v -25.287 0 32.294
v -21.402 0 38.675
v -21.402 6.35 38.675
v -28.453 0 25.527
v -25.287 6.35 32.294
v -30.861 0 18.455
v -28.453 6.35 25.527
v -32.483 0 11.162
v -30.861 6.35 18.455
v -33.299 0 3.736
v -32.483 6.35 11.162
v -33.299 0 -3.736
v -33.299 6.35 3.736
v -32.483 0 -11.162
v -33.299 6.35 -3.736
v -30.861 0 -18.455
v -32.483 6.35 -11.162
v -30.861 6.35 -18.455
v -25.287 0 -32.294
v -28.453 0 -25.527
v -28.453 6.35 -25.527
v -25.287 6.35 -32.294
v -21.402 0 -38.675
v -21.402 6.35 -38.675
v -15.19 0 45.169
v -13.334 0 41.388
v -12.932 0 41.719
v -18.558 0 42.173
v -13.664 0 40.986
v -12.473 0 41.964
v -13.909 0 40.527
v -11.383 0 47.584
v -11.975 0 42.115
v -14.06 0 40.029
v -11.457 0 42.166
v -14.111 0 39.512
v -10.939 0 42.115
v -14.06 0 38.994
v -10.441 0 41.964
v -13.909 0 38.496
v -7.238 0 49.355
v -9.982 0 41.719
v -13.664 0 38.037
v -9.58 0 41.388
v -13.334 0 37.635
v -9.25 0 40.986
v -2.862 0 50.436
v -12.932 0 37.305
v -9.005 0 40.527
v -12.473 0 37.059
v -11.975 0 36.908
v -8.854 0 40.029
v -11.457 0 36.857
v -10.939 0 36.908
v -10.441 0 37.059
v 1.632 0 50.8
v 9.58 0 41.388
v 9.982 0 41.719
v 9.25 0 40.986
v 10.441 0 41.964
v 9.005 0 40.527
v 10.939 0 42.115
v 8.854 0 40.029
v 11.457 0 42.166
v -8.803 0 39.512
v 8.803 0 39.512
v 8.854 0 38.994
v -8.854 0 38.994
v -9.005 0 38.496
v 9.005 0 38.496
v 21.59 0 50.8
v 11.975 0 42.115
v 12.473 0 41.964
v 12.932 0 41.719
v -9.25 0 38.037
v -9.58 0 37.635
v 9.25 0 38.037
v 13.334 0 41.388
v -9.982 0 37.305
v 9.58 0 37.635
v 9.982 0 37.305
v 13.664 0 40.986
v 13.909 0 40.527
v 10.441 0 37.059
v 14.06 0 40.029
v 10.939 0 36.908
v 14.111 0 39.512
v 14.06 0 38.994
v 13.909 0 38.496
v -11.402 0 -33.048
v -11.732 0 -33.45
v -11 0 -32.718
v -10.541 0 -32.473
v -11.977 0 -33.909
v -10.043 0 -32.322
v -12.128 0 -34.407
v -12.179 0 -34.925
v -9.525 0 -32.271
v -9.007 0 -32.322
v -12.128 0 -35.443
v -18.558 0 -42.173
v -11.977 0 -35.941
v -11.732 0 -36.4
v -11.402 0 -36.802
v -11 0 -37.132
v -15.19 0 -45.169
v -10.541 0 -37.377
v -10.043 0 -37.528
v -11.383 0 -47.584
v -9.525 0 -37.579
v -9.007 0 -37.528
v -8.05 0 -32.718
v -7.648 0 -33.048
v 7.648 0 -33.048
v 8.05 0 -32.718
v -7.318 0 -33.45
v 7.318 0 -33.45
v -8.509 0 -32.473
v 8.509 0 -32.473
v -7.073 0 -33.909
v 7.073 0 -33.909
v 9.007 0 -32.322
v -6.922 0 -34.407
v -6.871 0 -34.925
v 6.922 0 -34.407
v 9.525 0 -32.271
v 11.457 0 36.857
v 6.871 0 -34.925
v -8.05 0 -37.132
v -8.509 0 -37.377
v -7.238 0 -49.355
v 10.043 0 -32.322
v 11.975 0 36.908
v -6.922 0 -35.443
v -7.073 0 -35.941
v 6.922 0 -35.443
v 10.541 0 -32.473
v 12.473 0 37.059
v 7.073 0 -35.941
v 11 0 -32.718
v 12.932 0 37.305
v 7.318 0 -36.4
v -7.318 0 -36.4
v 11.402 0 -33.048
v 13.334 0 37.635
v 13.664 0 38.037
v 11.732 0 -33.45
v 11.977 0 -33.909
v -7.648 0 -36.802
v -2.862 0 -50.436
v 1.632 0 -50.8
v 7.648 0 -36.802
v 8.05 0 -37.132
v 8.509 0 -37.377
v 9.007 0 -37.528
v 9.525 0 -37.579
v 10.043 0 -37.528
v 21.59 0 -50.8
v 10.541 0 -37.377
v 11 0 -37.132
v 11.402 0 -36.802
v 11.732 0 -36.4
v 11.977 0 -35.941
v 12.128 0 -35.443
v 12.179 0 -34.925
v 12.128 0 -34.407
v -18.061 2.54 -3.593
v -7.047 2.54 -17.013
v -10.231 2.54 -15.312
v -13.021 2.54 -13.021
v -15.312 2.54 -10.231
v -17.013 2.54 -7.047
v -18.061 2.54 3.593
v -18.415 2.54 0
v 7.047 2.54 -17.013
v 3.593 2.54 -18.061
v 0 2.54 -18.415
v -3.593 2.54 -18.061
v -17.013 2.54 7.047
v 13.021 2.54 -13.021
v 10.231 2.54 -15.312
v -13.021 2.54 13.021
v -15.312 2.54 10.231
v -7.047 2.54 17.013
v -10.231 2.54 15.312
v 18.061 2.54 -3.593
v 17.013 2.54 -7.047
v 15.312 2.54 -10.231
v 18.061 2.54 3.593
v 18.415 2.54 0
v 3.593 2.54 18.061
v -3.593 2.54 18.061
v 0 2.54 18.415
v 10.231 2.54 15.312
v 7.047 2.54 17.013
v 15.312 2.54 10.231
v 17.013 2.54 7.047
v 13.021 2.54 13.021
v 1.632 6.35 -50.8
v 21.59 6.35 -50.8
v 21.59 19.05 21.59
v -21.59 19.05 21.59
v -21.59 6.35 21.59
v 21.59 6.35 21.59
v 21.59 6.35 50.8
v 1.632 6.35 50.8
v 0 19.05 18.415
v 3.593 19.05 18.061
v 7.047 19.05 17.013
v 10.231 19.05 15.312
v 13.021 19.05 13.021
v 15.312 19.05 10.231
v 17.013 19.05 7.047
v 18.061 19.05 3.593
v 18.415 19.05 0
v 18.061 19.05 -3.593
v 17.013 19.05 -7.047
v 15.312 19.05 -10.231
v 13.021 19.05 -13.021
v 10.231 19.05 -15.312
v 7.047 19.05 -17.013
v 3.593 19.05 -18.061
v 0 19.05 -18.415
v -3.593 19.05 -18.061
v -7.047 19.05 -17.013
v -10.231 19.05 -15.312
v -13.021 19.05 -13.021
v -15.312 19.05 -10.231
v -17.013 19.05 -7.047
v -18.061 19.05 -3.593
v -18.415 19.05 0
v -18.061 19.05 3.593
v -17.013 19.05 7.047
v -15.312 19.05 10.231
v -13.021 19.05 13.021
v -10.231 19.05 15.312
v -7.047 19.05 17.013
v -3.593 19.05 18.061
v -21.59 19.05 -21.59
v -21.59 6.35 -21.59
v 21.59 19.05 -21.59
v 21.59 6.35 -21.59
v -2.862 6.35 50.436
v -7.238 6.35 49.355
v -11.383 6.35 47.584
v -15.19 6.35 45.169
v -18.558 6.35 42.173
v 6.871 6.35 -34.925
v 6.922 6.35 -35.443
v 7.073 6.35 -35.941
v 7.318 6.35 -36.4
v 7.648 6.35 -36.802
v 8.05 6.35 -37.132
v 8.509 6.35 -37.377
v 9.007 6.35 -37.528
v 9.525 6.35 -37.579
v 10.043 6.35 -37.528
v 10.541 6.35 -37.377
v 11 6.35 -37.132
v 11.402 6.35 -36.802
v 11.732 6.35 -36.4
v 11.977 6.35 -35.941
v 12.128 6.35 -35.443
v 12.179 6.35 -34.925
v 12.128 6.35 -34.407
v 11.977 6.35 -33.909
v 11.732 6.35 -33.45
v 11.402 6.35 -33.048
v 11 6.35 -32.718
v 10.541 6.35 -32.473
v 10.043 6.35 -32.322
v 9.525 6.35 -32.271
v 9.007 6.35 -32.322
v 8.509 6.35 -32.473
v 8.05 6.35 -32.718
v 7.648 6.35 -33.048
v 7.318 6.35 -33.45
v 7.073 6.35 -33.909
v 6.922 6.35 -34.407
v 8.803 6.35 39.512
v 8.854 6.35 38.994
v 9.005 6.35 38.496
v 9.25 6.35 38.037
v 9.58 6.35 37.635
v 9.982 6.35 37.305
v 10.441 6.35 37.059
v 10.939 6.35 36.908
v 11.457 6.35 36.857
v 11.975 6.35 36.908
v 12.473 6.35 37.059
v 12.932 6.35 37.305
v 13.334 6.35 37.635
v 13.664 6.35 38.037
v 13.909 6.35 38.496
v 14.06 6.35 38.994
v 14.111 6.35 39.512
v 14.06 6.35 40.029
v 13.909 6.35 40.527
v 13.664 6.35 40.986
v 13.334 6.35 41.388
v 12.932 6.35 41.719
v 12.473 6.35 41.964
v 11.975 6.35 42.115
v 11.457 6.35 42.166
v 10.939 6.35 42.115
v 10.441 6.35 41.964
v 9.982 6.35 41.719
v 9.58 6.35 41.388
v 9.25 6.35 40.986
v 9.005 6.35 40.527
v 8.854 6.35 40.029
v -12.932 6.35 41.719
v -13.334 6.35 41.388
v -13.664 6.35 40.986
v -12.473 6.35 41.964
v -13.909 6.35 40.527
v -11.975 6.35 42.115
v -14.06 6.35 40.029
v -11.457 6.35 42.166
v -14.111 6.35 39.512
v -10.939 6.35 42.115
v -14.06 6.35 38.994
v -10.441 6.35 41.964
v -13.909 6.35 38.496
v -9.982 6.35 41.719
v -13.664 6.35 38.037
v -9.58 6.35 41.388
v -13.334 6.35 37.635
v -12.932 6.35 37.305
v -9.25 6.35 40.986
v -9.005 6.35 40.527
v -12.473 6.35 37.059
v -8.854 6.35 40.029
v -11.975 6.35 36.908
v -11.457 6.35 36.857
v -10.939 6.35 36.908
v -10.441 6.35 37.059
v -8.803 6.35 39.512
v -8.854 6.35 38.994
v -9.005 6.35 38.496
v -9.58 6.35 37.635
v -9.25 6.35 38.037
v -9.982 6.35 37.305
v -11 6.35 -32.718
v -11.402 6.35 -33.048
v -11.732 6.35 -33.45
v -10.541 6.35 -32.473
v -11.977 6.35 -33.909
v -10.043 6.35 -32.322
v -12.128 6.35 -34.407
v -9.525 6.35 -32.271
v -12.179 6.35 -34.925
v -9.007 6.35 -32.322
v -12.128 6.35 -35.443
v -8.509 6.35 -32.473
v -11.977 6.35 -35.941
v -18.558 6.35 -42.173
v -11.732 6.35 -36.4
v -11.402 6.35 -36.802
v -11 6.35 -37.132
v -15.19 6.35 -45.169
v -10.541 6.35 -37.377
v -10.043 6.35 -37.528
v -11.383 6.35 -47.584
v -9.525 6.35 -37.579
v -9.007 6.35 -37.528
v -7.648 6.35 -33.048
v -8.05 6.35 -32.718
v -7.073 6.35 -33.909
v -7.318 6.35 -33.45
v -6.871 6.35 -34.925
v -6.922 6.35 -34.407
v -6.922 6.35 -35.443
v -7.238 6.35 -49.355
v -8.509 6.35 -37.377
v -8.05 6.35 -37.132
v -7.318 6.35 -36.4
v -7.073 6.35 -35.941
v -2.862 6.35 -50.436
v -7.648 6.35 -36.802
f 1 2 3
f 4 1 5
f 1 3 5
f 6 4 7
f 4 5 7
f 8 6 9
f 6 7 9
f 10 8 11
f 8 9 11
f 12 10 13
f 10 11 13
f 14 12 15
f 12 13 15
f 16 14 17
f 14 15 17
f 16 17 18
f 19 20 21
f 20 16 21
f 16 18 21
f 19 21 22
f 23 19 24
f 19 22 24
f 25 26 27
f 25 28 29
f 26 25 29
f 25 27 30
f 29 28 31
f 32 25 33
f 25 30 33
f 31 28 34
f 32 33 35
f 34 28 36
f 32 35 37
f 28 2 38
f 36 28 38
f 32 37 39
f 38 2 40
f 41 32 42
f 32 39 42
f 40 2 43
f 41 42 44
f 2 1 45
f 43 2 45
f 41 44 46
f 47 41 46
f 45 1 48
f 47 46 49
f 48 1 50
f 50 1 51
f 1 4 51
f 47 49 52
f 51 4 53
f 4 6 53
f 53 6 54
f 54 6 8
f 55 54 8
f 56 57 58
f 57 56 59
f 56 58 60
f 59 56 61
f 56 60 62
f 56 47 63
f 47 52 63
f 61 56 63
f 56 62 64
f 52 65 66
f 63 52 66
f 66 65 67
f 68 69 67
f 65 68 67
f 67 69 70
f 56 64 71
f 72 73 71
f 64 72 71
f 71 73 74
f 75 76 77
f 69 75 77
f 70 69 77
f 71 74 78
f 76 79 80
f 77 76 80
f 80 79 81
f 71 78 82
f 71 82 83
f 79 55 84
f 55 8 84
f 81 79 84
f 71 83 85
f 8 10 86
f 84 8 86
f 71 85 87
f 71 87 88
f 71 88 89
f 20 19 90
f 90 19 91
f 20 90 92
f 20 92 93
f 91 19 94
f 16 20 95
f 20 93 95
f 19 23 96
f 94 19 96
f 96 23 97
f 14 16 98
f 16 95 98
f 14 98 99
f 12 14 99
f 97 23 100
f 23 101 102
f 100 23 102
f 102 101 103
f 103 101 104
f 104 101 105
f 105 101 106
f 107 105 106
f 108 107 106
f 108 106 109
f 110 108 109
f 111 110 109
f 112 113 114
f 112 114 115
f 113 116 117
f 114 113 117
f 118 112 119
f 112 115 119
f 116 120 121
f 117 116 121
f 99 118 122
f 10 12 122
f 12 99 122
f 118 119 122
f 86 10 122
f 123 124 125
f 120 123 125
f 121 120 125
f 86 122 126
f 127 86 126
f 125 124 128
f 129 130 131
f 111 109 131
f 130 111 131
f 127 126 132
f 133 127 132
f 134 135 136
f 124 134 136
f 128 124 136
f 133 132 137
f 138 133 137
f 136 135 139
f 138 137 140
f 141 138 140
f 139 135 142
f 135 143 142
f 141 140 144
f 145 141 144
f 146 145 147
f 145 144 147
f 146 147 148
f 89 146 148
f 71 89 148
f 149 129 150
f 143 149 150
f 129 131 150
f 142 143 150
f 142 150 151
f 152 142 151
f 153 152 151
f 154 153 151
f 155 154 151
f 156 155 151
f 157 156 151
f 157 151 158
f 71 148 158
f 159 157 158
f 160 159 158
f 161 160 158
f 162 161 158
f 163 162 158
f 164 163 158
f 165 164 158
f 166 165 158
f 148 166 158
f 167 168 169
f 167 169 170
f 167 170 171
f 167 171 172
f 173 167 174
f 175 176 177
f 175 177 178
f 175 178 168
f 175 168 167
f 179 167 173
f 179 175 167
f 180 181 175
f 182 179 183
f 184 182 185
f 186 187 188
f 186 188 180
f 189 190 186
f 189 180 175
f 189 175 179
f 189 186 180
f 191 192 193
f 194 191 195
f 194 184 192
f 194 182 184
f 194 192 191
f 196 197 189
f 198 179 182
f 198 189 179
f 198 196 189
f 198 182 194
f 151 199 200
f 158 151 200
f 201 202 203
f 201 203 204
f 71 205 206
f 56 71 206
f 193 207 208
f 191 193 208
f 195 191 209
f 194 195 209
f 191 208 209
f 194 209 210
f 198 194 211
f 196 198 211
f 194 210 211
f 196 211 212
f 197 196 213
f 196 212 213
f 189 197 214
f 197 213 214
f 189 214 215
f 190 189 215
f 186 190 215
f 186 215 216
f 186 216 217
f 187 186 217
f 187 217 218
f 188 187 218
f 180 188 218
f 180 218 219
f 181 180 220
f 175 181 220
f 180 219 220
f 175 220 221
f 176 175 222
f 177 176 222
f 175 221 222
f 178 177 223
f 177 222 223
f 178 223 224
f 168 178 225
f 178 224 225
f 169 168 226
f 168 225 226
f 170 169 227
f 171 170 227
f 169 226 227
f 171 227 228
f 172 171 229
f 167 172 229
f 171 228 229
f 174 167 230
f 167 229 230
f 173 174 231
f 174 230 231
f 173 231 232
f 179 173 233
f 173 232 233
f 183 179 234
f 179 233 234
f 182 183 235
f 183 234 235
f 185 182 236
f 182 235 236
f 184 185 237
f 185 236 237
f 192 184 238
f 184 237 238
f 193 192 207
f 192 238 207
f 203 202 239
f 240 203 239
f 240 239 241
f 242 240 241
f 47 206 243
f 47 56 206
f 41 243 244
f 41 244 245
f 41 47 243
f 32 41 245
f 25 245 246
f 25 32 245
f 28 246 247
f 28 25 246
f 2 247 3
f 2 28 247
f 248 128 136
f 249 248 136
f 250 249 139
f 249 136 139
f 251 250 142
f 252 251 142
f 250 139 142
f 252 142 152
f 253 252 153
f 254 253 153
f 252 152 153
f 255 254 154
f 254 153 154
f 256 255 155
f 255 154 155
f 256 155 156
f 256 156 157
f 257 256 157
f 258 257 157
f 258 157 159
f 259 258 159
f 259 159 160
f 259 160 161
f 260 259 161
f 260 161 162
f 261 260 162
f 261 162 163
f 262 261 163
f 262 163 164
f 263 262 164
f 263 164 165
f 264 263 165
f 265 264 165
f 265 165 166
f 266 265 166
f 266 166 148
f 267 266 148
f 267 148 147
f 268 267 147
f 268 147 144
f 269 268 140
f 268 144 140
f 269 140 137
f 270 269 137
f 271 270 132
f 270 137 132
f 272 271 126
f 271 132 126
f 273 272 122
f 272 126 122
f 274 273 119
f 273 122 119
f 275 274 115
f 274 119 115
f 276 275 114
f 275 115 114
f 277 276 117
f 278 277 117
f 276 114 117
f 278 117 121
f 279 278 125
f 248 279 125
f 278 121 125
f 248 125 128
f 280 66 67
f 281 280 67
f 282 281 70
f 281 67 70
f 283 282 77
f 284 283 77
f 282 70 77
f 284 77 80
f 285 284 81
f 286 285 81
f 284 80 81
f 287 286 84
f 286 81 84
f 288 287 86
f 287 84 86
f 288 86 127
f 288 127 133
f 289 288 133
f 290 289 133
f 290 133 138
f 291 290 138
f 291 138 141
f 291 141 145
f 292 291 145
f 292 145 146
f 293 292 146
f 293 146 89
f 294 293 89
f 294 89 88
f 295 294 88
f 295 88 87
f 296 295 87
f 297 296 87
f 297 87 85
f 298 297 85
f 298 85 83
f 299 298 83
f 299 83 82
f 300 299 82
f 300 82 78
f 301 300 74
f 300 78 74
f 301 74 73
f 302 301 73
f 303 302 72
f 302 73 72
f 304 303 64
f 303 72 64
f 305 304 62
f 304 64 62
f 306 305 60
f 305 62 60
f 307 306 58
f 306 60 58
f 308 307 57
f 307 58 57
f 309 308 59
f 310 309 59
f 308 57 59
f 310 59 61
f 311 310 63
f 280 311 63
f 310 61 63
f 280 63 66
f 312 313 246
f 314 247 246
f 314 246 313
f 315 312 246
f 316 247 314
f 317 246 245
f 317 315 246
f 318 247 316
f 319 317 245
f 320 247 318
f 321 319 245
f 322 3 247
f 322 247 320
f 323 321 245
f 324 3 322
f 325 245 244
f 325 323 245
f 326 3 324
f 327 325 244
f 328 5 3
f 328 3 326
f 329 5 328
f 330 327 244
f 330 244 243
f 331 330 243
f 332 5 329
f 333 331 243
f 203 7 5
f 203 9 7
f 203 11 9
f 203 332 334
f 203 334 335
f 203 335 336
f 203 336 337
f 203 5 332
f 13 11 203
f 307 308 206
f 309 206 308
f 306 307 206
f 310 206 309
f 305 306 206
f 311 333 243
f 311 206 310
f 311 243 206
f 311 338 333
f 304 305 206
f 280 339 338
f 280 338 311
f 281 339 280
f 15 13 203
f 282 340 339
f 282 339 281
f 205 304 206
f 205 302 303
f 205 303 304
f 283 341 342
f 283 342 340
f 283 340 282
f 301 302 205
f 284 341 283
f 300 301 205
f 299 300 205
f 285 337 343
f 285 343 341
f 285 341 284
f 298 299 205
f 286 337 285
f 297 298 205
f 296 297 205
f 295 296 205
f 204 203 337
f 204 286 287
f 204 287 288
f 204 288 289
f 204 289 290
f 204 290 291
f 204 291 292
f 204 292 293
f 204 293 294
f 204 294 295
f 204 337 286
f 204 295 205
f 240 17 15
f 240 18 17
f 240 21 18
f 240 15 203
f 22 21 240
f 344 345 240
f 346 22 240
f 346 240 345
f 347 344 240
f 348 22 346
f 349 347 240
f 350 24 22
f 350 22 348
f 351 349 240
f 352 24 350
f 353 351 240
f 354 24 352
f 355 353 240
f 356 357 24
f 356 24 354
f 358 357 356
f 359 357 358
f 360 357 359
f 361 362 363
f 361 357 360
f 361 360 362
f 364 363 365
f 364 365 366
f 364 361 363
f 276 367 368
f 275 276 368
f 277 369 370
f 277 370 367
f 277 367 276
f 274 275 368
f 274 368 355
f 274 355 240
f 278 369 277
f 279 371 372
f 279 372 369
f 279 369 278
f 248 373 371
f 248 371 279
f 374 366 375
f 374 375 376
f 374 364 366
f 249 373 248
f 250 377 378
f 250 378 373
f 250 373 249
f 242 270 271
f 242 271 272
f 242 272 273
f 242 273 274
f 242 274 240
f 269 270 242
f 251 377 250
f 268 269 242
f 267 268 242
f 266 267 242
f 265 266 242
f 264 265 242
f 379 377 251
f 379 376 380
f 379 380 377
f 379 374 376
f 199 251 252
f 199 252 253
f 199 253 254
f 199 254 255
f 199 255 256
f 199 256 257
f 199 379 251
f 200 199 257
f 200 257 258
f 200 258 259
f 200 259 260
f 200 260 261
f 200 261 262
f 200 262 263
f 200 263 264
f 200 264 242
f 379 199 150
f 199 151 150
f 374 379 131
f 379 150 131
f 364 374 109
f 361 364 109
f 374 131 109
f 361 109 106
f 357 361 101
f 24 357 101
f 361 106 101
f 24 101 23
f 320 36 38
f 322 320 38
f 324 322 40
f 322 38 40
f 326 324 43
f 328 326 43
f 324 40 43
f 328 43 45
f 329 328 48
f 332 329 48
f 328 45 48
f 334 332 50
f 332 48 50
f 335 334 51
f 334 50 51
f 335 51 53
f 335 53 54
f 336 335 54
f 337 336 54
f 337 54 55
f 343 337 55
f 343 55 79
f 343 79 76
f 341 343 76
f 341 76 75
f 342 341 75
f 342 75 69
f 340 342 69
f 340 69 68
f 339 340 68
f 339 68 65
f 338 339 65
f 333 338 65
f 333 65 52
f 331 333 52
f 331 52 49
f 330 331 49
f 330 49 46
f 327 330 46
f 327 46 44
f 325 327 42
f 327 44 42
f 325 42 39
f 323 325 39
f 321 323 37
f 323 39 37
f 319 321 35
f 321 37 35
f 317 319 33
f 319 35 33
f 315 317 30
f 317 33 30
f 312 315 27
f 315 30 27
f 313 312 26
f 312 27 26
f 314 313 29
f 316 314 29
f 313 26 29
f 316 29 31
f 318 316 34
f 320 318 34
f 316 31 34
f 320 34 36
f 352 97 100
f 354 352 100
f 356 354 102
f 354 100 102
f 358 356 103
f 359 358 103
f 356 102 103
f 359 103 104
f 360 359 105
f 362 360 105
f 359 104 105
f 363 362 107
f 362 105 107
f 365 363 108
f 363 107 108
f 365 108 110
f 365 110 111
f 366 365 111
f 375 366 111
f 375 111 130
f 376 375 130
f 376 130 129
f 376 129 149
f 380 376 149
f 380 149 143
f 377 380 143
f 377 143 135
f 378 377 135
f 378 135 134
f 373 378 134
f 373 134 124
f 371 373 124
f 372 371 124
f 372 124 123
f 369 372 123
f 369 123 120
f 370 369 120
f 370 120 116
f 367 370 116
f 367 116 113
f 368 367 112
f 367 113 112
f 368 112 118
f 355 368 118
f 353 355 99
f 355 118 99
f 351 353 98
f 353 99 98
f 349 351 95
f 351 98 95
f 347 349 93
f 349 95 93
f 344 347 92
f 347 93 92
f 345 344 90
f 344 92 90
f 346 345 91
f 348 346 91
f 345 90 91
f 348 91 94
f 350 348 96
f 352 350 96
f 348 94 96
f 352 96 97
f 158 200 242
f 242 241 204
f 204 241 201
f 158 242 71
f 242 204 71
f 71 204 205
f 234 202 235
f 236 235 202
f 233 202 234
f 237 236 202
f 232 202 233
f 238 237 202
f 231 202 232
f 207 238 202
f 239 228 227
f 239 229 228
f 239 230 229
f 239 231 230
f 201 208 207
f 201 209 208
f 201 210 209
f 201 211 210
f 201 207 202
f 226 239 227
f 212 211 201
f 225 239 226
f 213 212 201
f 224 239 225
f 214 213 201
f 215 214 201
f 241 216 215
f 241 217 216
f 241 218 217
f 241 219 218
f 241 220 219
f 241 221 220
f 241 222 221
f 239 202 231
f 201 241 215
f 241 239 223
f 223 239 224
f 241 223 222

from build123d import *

# Parameters (mm, degrees)
SKETCH2_R                  = 57.15
BOSS_EXTRUDE1_DEPTH        = 19.05
SKETCH3_R                  = 18.415
CUT_EXTRUDE1_DEPTH         = 16.51
SKETCH3_4_R                = 57.15
SKETCH3_4_W                = 43.18
SKETCH3_4_H                = 43.18
CUT_EXTRUDE2_DEPTH         = 12.7
SKETCH5_W                  = 114.3
SKETCH5_H                  = 114.3
CUT_EXTRUDE3_DEPTH         = 12.7
FILLET1_R                  = 27.94
F_4_0_209_DIAMETER_HOLE1_D = 5.3086


with BuildPart() as part:
    # Sketch2 → Boss-Extrude1 (new body)
    with BuildSketch(Plane(origin=(0, 0, 0), x_dir=(1, 0, 0), z_dir=(0, 1, 0))):
        with BuildLine():
            Line((-57.15, 57.15), (-57.15, -6.4e-08))
            ThreePointArc((-57.15, -6.4e-08), (-40.411152555, 40.411152534), (3.4e-08, 57.15))
            Line((3.4e-08, 57.15), (-57.15, 57.15))
        make_face()
        Circle(SKETCH2_R)
        with BuildLine():
            ThreePointArc((3.4e-08, 57.15), (40.411152557, 40.411152533), (57.15, 0))
            Line((57.15, 0), (57.15, 57.15))
            Line((57.15, 57.15), (3.4e-08, 57.15))
        make_face()
        with BuildLine():
            ThreePointArc((57.15, 0), (40.411152582, -40.411152508), (1.05e-07, -57.15))
            Line((1.05e-07, -57.15), (57.15, -57.15))
            Line((57.15, -57.15), (57.15, 0))
        make_face()
        with BuildLine():
            Line((-57.15, -6.4e-08), (-57.15, -57.15))
            Line((-57.15, -57.15), (1.05e-07, -57.15))
            ThreePointArc((1.05e-07, -57.15), (-40.411152485, -40.411152604), (-57.15, -6.4e-08))
        make_face()
    extrude(amount=BOSS_EXTRUDE1_DEPTH)

    # Sketch3 → Cut-Extrude1 (cut)
    with BuildSketch(Plane(origin=(0, 19.05, 0), x_dir=(1, 0, 0), z_dir=(0, 1, 0))):
        with Locations(Location((0, 0, 0), (0, 0, 270))):
            Circle(SKETCH3_R)
    extrude(amount=-CUT_EXTRUDE1_DEPTH, mode=Mode.SUBTRACT)

    # Sketch3<4> → Cut-Extrude2 (cut)
    with BuildSketch(Plane(origin=(0, 19.05, 0), x_dir=(1, 0, 0), z_dir=(0, 1, 0))):
        Circle(SKETCH3_4_R)
        Rectangle(SKETCH3_4_W, SKETCH3_4_H, mode=Mode.SUBTRACT)
        with BuildLine():
            Line((-57.15, -57.15), (9.5e-08, -57.15))
            ThreePointArc((9.5e-08, -57.15), (-40.411152547, -40.411152543), (-57.15, 1.01e-07))
            Line((-57.15, 1.01e-07), (-57.15, -57.15))
        make_face()
        with BuildLine():
            ThreePointArc((-57.15, 1.01e-07), (-40.411152509, 40.411152581), (0, 57.15))
            Line((0, 57.15), (-57.15, 57.15))
            Line((-57.15, 57.15), (-57.15, 1.01e-07))
        make_face()
        with BuildLine():
            ThreePointArc((0, 57.15), (40.411152545, 40.411152545), (57.15, 0))
            Line((57.15, 0), (57.15, 57.15))
            Line((57.15, 57.15), (0, 57.15))
        make_face()
        with BuildLine():
            Line((57.15, -57.15), (57.15, 0))
            ThreePointArc((57.15, 0), (40.411152578, -40.411152511), (9.5e-08, -57.15))
            Line((9.5e-08, -57.15), (57.15, -57.15))
        make_face()
    extrude(amount=-CUT_EXTRUDE2_DEPTH, mode=Mode.SUBTRACT)

    # Sketch5 → Cut-Extrude3 (cut)
    with BuildSketch(Plane(origin=(0, 6.35, 0), x_dir=(1, 0, 0), z_dir=(0, 1, 0))):
        Rectangle(SKETCH5_W, SKETCH5_H)
        with BuildLine():
            Line((21.59, 50.8), (21.59, -50.8))
            Line((21.59, -50.8), (-10.767475048, -50.8))
            ThreePointArc((-10.767475048, -50.8), (-33.401, 0), (-10.767475048, 50.8))
            Line((-10.767475048, 50.8), (21.59, 50.8))
        make_face(mode=Mode.SUBTRACT)
    extrude(amount=-CUT_EXTRUDE3_DEPTH, mode=Mode.SUBTRACT)

    # Fillet1
    fillet1_edges = [part.edges().sort_by_distance(p)[0] for p in [
        (-10.767475048, 3.175, -50.8),
        (-10.767475048, 3.175, 50.8),
    ]]
    fillet(fillet1_edges, radius=FILLET1_R)

    # #4 (0.209) Diameter Hole1 (through all)
    with Locations(Plane(origin=(0, 6.35, 0), x_dir=(1, 0, 0), z_dir=(0, 1, 0))):
        with Locations((-9.525, 34.925), (9.525, 34.925), (11.456890961, -39.511615824), (-11.456890961, -39.511615824)):
            Hole(F_4_0_209_DIAMETER_HOLE1_D / 2)


solid = part.part
